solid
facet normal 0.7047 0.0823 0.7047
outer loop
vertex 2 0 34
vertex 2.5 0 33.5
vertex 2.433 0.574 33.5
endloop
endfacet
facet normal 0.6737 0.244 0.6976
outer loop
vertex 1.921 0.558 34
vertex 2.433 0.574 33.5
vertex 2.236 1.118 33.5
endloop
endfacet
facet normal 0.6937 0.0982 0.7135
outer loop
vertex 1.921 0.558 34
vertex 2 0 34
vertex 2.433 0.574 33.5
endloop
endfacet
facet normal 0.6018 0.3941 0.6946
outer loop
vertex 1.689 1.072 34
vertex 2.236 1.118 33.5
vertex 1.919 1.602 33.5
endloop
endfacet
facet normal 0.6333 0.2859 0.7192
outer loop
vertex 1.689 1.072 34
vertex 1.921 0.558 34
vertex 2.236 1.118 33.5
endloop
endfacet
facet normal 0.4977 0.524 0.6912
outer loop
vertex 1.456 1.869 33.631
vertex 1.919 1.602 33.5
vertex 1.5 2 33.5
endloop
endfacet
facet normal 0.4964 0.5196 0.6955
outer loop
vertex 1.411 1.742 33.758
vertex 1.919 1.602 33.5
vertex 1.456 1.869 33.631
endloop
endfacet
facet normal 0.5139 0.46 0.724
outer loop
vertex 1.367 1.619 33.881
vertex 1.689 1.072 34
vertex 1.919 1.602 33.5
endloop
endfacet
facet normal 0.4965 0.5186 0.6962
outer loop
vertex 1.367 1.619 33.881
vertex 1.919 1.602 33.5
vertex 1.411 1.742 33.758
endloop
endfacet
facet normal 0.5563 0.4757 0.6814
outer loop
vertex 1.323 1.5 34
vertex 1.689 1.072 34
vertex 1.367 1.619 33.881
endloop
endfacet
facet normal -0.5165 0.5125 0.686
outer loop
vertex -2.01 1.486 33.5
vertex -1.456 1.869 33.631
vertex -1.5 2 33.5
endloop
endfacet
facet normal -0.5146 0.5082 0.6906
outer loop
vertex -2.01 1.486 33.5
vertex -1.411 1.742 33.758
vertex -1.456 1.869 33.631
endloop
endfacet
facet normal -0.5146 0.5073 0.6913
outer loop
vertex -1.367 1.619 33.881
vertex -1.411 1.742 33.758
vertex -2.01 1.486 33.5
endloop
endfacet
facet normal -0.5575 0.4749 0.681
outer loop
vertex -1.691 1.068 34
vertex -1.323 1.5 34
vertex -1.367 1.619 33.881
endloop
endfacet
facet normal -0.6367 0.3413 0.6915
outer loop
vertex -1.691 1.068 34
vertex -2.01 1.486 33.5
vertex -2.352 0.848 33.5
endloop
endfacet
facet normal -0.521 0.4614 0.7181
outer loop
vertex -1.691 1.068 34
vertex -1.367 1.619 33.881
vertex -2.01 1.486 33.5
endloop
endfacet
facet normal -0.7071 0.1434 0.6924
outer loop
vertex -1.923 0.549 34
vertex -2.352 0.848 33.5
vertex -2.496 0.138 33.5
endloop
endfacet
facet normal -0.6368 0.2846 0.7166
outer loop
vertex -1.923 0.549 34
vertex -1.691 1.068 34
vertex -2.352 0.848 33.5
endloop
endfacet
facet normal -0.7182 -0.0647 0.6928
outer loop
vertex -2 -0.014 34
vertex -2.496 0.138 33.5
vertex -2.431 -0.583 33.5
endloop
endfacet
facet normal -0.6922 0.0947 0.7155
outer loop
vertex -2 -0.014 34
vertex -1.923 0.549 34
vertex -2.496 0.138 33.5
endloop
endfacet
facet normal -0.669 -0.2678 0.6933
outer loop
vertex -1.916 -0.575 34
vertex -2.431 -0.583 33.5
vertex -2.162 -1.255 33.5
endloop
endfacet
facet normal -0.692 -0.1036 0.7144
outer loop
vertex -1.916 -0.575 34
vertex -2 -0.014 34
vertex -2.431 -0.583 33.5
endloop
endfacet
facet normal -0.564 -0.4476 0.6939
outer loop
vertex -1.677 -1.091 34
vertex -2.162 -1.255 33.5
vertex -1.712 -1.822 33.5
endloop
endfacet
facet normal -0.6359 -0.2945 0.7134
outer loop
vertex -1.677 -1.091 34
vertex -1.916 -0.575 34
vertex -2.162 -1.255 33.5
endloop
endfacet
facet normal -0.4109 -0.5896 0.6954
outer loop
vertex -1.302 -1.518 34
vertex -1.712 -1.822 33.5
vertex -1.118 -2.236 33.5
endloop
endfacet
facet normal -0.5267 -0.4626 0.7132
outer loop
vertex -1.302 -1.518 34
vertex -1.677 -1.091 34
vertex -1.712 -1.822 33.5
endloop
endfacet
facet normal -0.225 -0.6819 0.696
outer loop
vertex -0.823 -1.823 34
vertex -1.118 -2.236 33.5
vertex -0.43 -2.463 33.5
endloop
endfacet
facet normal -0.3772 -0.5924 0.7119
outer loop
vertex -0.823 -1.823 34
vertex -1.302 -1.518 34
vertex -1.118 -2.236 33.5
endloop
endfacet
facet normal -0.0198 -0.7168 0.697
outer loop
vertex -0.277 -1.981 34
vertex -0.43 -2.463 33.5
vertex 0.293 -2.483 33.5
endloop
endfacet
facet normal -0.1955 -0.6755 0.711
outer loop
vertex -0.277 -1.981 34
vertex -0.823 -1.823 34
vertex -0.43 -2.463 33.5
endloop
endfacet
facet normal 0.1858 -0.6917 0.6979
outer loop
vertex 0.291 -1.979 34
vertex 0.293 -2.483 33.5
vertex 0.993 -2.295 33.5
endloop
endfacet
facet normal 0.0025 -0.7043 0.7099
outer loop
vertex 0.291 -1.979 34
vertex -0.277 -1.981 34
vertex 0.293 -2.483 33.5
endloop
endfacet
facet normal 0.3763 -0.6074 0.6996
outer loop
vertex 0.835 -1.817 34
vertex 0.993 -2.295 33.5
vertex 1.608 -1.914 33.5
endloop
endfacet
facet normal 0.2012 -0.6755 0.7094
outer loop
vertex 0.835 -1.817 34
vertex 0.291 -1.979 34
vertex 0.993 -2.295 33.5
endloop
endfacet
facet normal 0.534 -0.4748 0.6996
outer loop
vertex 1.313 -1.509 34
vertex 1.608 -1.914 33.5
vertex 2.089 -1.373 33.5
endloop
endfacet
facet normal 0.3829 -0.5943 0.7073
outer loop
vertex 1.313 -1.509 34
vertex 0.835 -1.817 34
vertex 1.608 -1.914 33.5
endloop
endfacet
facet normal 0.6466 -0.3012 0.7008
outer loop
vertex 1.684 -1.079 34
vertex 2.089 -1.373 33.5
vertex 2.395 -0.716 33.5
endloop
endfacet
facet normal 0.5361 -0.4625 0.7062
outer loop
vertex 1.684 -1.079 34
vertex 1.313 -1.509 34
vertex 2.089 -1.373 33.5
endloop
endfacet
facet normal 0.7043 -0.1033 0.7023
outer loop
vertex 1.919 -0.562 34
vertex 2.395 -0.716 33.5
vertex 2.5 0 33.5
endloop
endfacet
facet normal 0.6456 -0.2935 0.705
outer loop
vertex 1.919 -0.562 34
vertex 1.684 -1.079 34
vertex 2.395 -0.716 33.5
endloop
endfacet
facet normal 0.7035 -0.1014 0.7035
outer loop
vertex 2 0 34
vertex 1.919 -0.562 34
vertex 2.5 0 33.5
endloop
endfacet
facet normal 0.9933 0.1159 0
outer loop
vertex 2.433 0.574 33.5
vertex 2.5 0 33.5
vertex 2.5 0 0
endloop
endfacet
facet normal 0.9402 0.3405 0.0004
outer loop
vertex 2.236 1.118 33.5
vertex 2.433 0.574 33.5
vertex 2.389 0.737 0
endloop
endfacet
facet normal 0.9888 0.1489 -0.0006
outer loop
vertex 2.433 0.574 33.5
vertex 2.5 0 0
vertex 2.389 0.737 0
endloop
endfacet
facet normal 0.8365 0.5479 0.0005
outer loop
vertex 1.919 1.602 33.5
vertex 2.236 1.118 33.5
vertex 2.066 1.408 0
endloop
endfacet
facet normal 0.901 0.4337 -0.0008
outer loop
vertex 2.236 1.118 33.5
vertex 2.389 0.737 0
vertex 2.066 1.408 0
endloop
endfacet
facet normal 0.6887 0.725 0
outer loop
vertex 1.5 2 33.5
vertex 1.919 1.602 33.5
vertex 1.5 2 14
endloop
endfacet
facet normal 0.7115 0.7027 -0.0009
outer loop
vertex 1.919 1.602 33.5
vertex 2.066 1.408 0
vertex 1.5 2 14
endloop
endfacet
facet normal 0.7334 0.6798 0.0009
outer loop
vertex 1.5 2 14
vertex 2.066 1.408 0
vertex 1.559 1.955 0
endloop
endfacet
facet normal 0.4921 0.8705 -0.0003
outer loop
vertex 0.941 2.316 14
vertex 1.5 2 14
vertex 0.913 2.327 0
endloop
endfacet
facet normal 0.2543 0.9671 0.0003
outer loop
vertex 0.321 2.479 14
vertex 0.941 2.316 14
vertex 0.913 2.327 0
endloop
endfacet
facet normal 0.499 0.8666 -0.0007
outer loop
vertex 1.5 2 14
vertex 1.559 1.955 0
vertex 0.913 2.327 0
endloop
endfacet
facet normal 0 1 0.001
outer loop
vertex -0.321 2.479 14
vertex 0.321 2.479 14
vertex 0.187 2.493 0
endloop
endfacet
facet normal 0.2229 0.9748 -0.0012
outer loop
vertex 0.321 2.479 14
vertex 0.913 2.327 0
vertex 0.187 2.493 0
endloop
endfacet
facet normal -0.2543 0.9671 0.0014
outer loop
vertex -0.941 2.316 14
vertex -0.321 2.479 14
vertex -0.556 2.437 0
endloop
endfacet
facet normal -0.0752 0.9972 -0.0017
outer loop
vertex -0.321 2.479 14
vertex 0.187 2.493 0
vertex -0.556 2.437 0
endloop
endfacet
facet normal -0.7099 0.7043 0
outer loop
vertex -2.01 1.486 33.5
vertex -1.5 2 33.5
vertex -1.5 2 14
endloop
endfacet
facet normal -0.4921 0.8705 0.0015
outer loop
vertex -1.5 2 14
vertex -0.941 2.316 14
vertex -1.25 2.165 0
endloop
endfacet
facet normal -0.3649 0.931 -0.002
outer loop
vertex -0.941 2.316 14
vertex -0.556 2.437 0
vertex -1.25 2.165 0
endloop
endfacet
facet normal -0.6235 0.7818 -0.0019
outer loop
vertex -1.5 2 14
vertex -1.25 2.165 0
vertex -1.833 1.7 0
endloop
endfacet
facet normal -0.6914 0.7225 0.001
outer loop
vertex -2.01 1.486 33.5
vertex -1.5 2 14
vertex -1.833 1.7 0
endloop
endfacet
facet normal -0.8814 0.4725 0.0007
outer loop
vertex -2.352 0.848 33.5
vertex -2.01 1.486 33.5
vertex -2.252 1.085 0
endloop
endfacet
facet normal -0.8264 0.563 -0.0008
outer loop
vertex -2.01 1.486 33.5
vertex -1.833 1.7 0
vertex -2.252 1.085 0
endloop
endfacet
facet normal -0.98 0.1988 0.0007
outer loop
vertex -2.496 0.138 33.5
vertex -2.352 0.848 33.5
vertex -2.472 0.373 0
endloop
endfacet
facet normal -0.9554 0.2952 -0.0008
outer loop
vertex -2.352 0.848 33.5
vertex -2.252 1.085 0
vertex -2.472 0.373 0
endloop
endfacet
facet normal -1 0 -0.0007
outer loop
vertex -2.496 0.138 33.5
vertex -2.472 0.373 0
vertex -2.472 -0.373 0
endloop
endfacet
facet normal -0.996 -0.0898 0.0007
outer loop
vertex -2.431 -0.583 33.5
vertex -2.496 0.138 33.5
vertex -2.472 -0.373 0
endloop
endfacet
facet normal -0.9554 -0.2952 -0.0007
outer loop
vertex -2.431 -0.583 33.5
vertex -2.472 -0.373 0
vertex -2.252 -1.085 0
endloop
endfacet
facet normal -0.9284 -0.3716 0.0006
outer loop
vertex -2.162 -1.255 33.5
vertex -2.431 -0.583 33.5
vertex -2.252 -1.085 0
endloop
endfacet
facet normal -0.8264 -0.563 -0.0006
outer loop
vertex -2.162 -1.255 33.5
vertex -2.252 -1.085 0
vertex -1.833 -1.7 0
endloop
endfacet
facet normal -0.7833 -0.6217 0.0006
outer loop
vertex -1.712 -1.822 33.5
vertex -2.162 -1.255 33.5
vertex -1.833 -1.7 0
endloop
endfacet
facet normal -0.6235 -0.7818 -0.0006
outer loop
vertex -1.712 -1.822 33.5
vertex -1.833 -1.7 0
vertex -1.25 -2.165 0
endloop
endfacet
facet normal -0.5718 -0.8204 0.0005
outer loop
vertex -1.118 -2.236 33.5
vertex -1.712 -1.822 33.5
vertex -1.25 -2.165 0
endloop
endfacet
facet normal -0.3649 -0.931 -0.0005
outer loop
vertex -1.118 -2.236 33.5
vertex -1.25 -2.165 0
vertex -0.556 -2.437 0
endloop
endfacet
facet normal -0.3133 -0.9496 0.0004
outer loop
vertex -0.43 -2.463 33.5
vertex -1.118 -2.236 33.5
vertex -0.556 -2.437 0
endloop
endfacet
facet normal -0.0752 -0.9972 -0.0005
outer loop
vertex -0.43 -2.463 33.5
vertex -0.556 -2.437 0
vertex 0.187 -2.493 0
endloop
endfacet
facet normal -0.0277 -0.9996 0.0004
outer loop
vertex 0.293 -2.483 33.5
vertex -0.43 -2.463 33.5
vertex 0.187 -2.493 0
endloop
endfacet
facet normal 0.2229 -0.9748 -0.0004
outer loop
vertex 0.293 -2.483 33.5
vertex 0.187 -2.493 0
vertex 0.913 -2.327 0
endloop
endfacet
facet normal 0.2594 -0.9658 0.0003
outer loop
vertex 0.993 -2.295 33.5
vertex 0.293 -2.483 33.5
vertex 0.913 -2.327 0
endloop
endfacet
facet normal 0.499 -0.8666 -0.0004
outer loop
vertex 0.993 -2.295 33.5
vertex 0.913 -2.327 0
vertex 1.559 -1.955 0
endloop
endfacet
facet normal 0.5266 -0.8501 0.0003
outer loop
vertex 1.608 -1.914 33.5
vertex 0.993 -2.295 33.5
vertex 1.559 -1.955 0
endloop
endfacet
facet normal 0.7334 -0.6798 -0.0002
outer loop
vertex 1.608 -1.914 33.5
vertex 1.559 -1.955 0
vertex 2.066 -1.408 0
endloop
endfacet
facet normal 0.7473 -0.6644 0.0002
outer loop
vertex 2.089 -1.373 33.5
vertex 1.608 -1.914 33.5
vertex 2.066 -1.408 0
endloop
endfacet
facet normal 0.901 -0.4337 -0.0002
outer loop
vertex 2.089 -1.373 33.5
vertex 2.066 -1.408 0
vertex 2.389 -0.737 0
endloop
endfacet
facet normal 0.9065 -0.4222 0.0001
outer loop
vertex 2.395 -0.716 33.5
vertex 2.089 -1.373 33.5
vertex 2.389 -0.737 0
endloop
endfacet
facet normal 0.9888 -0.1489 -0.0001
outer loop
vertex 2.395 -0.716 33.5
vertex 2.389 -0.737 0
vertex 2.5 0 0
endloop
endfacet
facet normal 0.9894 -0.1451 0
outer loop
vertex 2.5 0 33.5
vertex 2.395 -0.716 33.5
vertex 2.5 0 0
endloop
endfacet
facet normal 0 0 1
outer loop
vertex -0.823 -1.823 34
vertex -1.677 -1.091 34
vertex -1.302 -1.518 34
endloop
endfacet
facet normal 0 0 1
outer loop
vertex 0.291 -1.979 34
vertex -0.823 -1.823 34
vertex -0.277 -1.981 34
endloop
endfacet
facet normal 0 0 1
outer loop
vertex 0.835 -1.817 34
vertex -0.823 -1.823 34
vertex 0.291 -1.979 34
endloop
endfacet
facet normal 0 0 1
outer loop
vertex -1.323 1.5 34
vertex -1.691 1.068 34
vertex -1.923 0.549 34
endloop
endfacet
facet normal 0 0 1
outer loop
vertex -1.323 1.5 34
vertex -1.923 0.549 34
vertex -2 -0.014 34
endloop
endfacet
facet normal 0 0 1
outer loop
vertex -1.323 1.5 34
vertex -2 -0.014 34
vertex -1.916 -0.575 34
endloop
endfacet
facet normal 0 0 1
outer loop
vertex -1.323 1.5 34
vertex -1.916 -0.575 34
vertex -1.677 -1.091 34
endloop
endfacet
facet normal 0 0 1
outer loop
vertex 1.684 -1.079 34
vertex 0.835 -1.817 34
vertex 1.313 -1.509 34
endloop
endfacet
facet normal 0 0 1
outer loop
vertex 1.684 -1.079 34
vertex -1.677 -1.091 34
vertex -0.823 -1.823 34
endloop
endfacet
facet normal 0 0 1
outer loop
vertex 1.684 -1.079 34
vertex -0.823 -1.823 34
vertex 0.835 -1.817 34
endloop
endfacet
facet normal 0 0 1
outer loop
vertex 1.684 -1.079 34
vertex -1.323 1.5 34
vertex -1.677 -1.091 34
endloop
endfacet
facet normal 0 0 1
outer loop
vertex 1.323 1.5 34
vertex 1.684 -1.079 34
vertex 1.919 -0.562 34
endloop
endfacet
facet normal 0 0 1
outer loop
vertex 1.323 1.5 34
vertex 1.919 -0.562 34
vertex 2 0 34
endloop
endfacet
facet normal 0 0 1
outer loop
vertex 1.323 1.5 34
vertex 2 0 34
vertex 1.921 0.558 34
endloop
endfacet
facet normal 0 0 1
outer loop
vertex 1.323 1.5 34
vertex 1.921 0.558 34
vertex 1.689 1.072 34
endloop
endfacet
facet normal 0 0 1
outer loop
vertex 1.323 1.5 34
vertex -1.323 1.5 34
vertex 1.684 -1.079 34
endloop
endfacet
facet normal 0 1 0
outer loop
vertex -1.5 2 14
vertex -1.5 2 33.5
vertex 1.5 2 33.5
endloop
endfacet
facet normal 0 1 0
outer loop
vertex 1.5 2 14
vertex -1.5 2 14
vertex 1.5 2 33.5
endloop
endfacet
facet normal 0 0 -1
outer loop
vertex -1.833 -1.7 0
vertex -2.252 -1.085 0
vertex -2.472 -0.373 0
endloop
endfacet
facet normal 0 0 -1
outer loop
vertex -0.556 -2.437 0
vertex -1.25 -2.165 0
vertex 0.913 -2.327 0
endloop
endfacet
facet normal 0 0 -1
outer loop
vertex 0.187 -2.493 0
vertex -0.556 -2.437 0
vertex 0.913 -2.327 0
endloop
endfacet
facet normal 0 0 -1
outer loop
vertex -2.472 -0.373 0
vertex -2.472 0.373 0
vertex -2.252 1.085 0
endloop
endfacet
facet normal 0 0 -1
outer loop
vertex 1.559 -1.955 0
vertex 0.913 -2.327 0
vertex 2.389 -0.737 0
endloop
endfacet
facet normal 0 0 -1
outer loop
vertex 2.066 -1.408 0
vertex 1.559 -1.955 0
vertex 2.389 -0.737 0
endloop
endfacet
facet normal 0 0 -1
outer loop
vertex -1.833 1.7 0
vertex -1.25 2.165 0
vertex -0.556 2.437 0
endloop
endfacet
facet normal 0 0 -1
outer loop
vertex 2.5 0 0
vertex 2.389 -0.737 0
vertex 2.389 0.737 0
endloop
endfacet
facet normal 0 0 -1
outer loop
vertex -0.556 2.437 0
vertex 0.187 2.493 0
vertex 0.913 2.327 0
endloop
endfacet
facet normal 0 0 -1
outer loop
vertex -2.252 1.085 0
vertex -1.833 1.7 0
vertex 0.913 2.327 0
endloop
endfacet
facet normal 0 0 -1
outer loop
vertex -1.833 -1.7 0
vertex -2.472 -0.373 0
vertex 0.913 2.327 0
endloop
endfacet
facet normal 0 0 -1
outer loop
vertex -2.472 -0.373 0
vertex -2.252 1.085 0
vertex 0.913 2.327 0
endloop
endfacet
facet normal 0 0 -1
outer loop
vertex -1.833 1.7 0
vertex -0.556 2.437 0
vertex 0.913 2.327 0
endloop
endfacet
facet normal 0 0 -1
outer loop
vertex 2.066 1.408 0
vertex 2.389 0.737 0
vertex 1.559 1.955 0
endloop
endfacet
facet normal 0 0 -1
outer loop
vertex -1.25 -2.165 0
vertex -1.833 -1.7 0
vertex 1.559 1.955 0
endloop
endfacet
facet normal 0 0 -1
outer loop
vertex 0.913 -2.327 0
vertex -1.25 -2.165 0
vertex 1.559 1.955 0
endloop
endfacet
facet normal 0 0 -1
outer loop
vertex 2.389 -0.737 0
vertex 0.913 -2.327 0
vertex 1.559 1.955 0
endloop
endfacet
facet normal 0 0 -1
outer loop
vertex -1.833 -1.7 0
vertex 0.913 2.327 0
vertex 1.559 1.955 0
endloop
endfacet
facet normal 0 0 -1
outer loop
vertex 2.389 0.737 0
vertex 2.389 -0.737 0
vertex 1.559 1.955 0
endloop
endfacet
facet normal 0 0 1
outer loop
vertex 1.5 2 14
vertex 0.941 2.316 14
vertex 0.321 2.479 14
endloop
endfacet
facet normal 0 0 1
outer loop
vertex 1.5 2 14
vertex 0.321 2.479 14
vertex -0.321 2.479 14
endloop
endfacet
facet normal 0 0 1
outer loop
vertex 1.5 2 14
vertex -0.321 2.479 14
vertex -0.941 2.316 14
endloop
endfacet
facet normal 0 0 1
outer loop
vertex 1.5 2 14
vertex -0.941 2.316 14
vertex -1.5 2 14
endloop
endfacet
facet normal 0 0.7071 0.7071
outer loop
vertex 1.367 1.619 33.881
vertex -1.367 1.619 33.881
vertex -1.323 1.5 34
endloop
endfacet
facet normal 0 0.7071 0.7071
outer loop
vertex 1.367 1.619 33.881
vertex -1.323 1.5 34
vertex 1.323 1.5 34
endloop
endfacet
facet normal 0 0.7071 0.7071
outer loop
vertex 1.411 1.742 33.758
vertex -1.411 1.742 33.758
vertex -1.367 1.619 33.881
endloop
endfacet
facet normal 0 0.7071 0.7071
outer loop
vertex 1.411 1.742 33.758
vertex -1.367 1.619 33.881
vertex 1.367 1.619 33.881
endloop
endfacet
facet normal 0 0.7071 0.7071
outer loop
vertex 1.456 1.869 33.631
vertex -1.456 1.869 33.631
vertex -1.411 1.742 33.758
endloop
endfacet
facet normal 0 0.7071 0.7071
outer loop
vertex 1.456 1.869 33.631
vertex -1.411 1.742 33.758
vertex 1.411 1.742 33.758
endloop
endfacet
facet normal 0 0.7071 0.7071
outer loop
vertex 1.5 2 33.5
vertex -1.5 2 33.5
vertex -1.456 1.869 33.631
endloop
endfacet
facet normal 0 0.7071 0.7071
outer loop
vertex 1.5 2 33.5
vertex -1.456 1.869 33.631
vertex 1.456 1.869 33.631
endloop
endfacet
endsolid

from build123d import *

# Parameters (mm, degrees)
SKETCH_1_R          = 2.5
EXTRUDE_5_DEPTH     = 34
CUT_EXTRUDE_START   = -20
CUT_EXTRUDE_2_DEPTH = 20
CHAMFER_2_SIZE      = 0.5


with BuildPart() as part:
    # 草图1 → 凸台-拉伸5 (new body)
    with BuildSketch(Plane.XY):
        Circle(SKETCH_1_R)
    extrude(amount=EXTRUDE_5_DEPTH)

    # 草图4 → 切除-拉伸2 (cut)
    with BuildSketch(Plane.XY.offset(34).offset(CUT_EXTRUDE_START)):
        with BuildLine():
            Line((-1.5, 2), (1.5, 2))
            ThreePointArc((1.5, 2), (0, 2.5), (-1.5, 2))
        make_face()
    extrude(amount=CUT_EXTRUDE_2_DEPTH, mode=Mode.SUBTRACT)

    # 倒角2
    chamfer_2_edges = [part.edges().sort_by_distance(p)[0] for p in [
        (-1.118033989, -2.236067977, 34),
        (0, 2, 34),
    ]]
    chamfer(chamfer_2_edges, length=CHAMFER_2_SIZE - 0.0001)  # a hair under: the kernel refuses the full size


solid = part.part
